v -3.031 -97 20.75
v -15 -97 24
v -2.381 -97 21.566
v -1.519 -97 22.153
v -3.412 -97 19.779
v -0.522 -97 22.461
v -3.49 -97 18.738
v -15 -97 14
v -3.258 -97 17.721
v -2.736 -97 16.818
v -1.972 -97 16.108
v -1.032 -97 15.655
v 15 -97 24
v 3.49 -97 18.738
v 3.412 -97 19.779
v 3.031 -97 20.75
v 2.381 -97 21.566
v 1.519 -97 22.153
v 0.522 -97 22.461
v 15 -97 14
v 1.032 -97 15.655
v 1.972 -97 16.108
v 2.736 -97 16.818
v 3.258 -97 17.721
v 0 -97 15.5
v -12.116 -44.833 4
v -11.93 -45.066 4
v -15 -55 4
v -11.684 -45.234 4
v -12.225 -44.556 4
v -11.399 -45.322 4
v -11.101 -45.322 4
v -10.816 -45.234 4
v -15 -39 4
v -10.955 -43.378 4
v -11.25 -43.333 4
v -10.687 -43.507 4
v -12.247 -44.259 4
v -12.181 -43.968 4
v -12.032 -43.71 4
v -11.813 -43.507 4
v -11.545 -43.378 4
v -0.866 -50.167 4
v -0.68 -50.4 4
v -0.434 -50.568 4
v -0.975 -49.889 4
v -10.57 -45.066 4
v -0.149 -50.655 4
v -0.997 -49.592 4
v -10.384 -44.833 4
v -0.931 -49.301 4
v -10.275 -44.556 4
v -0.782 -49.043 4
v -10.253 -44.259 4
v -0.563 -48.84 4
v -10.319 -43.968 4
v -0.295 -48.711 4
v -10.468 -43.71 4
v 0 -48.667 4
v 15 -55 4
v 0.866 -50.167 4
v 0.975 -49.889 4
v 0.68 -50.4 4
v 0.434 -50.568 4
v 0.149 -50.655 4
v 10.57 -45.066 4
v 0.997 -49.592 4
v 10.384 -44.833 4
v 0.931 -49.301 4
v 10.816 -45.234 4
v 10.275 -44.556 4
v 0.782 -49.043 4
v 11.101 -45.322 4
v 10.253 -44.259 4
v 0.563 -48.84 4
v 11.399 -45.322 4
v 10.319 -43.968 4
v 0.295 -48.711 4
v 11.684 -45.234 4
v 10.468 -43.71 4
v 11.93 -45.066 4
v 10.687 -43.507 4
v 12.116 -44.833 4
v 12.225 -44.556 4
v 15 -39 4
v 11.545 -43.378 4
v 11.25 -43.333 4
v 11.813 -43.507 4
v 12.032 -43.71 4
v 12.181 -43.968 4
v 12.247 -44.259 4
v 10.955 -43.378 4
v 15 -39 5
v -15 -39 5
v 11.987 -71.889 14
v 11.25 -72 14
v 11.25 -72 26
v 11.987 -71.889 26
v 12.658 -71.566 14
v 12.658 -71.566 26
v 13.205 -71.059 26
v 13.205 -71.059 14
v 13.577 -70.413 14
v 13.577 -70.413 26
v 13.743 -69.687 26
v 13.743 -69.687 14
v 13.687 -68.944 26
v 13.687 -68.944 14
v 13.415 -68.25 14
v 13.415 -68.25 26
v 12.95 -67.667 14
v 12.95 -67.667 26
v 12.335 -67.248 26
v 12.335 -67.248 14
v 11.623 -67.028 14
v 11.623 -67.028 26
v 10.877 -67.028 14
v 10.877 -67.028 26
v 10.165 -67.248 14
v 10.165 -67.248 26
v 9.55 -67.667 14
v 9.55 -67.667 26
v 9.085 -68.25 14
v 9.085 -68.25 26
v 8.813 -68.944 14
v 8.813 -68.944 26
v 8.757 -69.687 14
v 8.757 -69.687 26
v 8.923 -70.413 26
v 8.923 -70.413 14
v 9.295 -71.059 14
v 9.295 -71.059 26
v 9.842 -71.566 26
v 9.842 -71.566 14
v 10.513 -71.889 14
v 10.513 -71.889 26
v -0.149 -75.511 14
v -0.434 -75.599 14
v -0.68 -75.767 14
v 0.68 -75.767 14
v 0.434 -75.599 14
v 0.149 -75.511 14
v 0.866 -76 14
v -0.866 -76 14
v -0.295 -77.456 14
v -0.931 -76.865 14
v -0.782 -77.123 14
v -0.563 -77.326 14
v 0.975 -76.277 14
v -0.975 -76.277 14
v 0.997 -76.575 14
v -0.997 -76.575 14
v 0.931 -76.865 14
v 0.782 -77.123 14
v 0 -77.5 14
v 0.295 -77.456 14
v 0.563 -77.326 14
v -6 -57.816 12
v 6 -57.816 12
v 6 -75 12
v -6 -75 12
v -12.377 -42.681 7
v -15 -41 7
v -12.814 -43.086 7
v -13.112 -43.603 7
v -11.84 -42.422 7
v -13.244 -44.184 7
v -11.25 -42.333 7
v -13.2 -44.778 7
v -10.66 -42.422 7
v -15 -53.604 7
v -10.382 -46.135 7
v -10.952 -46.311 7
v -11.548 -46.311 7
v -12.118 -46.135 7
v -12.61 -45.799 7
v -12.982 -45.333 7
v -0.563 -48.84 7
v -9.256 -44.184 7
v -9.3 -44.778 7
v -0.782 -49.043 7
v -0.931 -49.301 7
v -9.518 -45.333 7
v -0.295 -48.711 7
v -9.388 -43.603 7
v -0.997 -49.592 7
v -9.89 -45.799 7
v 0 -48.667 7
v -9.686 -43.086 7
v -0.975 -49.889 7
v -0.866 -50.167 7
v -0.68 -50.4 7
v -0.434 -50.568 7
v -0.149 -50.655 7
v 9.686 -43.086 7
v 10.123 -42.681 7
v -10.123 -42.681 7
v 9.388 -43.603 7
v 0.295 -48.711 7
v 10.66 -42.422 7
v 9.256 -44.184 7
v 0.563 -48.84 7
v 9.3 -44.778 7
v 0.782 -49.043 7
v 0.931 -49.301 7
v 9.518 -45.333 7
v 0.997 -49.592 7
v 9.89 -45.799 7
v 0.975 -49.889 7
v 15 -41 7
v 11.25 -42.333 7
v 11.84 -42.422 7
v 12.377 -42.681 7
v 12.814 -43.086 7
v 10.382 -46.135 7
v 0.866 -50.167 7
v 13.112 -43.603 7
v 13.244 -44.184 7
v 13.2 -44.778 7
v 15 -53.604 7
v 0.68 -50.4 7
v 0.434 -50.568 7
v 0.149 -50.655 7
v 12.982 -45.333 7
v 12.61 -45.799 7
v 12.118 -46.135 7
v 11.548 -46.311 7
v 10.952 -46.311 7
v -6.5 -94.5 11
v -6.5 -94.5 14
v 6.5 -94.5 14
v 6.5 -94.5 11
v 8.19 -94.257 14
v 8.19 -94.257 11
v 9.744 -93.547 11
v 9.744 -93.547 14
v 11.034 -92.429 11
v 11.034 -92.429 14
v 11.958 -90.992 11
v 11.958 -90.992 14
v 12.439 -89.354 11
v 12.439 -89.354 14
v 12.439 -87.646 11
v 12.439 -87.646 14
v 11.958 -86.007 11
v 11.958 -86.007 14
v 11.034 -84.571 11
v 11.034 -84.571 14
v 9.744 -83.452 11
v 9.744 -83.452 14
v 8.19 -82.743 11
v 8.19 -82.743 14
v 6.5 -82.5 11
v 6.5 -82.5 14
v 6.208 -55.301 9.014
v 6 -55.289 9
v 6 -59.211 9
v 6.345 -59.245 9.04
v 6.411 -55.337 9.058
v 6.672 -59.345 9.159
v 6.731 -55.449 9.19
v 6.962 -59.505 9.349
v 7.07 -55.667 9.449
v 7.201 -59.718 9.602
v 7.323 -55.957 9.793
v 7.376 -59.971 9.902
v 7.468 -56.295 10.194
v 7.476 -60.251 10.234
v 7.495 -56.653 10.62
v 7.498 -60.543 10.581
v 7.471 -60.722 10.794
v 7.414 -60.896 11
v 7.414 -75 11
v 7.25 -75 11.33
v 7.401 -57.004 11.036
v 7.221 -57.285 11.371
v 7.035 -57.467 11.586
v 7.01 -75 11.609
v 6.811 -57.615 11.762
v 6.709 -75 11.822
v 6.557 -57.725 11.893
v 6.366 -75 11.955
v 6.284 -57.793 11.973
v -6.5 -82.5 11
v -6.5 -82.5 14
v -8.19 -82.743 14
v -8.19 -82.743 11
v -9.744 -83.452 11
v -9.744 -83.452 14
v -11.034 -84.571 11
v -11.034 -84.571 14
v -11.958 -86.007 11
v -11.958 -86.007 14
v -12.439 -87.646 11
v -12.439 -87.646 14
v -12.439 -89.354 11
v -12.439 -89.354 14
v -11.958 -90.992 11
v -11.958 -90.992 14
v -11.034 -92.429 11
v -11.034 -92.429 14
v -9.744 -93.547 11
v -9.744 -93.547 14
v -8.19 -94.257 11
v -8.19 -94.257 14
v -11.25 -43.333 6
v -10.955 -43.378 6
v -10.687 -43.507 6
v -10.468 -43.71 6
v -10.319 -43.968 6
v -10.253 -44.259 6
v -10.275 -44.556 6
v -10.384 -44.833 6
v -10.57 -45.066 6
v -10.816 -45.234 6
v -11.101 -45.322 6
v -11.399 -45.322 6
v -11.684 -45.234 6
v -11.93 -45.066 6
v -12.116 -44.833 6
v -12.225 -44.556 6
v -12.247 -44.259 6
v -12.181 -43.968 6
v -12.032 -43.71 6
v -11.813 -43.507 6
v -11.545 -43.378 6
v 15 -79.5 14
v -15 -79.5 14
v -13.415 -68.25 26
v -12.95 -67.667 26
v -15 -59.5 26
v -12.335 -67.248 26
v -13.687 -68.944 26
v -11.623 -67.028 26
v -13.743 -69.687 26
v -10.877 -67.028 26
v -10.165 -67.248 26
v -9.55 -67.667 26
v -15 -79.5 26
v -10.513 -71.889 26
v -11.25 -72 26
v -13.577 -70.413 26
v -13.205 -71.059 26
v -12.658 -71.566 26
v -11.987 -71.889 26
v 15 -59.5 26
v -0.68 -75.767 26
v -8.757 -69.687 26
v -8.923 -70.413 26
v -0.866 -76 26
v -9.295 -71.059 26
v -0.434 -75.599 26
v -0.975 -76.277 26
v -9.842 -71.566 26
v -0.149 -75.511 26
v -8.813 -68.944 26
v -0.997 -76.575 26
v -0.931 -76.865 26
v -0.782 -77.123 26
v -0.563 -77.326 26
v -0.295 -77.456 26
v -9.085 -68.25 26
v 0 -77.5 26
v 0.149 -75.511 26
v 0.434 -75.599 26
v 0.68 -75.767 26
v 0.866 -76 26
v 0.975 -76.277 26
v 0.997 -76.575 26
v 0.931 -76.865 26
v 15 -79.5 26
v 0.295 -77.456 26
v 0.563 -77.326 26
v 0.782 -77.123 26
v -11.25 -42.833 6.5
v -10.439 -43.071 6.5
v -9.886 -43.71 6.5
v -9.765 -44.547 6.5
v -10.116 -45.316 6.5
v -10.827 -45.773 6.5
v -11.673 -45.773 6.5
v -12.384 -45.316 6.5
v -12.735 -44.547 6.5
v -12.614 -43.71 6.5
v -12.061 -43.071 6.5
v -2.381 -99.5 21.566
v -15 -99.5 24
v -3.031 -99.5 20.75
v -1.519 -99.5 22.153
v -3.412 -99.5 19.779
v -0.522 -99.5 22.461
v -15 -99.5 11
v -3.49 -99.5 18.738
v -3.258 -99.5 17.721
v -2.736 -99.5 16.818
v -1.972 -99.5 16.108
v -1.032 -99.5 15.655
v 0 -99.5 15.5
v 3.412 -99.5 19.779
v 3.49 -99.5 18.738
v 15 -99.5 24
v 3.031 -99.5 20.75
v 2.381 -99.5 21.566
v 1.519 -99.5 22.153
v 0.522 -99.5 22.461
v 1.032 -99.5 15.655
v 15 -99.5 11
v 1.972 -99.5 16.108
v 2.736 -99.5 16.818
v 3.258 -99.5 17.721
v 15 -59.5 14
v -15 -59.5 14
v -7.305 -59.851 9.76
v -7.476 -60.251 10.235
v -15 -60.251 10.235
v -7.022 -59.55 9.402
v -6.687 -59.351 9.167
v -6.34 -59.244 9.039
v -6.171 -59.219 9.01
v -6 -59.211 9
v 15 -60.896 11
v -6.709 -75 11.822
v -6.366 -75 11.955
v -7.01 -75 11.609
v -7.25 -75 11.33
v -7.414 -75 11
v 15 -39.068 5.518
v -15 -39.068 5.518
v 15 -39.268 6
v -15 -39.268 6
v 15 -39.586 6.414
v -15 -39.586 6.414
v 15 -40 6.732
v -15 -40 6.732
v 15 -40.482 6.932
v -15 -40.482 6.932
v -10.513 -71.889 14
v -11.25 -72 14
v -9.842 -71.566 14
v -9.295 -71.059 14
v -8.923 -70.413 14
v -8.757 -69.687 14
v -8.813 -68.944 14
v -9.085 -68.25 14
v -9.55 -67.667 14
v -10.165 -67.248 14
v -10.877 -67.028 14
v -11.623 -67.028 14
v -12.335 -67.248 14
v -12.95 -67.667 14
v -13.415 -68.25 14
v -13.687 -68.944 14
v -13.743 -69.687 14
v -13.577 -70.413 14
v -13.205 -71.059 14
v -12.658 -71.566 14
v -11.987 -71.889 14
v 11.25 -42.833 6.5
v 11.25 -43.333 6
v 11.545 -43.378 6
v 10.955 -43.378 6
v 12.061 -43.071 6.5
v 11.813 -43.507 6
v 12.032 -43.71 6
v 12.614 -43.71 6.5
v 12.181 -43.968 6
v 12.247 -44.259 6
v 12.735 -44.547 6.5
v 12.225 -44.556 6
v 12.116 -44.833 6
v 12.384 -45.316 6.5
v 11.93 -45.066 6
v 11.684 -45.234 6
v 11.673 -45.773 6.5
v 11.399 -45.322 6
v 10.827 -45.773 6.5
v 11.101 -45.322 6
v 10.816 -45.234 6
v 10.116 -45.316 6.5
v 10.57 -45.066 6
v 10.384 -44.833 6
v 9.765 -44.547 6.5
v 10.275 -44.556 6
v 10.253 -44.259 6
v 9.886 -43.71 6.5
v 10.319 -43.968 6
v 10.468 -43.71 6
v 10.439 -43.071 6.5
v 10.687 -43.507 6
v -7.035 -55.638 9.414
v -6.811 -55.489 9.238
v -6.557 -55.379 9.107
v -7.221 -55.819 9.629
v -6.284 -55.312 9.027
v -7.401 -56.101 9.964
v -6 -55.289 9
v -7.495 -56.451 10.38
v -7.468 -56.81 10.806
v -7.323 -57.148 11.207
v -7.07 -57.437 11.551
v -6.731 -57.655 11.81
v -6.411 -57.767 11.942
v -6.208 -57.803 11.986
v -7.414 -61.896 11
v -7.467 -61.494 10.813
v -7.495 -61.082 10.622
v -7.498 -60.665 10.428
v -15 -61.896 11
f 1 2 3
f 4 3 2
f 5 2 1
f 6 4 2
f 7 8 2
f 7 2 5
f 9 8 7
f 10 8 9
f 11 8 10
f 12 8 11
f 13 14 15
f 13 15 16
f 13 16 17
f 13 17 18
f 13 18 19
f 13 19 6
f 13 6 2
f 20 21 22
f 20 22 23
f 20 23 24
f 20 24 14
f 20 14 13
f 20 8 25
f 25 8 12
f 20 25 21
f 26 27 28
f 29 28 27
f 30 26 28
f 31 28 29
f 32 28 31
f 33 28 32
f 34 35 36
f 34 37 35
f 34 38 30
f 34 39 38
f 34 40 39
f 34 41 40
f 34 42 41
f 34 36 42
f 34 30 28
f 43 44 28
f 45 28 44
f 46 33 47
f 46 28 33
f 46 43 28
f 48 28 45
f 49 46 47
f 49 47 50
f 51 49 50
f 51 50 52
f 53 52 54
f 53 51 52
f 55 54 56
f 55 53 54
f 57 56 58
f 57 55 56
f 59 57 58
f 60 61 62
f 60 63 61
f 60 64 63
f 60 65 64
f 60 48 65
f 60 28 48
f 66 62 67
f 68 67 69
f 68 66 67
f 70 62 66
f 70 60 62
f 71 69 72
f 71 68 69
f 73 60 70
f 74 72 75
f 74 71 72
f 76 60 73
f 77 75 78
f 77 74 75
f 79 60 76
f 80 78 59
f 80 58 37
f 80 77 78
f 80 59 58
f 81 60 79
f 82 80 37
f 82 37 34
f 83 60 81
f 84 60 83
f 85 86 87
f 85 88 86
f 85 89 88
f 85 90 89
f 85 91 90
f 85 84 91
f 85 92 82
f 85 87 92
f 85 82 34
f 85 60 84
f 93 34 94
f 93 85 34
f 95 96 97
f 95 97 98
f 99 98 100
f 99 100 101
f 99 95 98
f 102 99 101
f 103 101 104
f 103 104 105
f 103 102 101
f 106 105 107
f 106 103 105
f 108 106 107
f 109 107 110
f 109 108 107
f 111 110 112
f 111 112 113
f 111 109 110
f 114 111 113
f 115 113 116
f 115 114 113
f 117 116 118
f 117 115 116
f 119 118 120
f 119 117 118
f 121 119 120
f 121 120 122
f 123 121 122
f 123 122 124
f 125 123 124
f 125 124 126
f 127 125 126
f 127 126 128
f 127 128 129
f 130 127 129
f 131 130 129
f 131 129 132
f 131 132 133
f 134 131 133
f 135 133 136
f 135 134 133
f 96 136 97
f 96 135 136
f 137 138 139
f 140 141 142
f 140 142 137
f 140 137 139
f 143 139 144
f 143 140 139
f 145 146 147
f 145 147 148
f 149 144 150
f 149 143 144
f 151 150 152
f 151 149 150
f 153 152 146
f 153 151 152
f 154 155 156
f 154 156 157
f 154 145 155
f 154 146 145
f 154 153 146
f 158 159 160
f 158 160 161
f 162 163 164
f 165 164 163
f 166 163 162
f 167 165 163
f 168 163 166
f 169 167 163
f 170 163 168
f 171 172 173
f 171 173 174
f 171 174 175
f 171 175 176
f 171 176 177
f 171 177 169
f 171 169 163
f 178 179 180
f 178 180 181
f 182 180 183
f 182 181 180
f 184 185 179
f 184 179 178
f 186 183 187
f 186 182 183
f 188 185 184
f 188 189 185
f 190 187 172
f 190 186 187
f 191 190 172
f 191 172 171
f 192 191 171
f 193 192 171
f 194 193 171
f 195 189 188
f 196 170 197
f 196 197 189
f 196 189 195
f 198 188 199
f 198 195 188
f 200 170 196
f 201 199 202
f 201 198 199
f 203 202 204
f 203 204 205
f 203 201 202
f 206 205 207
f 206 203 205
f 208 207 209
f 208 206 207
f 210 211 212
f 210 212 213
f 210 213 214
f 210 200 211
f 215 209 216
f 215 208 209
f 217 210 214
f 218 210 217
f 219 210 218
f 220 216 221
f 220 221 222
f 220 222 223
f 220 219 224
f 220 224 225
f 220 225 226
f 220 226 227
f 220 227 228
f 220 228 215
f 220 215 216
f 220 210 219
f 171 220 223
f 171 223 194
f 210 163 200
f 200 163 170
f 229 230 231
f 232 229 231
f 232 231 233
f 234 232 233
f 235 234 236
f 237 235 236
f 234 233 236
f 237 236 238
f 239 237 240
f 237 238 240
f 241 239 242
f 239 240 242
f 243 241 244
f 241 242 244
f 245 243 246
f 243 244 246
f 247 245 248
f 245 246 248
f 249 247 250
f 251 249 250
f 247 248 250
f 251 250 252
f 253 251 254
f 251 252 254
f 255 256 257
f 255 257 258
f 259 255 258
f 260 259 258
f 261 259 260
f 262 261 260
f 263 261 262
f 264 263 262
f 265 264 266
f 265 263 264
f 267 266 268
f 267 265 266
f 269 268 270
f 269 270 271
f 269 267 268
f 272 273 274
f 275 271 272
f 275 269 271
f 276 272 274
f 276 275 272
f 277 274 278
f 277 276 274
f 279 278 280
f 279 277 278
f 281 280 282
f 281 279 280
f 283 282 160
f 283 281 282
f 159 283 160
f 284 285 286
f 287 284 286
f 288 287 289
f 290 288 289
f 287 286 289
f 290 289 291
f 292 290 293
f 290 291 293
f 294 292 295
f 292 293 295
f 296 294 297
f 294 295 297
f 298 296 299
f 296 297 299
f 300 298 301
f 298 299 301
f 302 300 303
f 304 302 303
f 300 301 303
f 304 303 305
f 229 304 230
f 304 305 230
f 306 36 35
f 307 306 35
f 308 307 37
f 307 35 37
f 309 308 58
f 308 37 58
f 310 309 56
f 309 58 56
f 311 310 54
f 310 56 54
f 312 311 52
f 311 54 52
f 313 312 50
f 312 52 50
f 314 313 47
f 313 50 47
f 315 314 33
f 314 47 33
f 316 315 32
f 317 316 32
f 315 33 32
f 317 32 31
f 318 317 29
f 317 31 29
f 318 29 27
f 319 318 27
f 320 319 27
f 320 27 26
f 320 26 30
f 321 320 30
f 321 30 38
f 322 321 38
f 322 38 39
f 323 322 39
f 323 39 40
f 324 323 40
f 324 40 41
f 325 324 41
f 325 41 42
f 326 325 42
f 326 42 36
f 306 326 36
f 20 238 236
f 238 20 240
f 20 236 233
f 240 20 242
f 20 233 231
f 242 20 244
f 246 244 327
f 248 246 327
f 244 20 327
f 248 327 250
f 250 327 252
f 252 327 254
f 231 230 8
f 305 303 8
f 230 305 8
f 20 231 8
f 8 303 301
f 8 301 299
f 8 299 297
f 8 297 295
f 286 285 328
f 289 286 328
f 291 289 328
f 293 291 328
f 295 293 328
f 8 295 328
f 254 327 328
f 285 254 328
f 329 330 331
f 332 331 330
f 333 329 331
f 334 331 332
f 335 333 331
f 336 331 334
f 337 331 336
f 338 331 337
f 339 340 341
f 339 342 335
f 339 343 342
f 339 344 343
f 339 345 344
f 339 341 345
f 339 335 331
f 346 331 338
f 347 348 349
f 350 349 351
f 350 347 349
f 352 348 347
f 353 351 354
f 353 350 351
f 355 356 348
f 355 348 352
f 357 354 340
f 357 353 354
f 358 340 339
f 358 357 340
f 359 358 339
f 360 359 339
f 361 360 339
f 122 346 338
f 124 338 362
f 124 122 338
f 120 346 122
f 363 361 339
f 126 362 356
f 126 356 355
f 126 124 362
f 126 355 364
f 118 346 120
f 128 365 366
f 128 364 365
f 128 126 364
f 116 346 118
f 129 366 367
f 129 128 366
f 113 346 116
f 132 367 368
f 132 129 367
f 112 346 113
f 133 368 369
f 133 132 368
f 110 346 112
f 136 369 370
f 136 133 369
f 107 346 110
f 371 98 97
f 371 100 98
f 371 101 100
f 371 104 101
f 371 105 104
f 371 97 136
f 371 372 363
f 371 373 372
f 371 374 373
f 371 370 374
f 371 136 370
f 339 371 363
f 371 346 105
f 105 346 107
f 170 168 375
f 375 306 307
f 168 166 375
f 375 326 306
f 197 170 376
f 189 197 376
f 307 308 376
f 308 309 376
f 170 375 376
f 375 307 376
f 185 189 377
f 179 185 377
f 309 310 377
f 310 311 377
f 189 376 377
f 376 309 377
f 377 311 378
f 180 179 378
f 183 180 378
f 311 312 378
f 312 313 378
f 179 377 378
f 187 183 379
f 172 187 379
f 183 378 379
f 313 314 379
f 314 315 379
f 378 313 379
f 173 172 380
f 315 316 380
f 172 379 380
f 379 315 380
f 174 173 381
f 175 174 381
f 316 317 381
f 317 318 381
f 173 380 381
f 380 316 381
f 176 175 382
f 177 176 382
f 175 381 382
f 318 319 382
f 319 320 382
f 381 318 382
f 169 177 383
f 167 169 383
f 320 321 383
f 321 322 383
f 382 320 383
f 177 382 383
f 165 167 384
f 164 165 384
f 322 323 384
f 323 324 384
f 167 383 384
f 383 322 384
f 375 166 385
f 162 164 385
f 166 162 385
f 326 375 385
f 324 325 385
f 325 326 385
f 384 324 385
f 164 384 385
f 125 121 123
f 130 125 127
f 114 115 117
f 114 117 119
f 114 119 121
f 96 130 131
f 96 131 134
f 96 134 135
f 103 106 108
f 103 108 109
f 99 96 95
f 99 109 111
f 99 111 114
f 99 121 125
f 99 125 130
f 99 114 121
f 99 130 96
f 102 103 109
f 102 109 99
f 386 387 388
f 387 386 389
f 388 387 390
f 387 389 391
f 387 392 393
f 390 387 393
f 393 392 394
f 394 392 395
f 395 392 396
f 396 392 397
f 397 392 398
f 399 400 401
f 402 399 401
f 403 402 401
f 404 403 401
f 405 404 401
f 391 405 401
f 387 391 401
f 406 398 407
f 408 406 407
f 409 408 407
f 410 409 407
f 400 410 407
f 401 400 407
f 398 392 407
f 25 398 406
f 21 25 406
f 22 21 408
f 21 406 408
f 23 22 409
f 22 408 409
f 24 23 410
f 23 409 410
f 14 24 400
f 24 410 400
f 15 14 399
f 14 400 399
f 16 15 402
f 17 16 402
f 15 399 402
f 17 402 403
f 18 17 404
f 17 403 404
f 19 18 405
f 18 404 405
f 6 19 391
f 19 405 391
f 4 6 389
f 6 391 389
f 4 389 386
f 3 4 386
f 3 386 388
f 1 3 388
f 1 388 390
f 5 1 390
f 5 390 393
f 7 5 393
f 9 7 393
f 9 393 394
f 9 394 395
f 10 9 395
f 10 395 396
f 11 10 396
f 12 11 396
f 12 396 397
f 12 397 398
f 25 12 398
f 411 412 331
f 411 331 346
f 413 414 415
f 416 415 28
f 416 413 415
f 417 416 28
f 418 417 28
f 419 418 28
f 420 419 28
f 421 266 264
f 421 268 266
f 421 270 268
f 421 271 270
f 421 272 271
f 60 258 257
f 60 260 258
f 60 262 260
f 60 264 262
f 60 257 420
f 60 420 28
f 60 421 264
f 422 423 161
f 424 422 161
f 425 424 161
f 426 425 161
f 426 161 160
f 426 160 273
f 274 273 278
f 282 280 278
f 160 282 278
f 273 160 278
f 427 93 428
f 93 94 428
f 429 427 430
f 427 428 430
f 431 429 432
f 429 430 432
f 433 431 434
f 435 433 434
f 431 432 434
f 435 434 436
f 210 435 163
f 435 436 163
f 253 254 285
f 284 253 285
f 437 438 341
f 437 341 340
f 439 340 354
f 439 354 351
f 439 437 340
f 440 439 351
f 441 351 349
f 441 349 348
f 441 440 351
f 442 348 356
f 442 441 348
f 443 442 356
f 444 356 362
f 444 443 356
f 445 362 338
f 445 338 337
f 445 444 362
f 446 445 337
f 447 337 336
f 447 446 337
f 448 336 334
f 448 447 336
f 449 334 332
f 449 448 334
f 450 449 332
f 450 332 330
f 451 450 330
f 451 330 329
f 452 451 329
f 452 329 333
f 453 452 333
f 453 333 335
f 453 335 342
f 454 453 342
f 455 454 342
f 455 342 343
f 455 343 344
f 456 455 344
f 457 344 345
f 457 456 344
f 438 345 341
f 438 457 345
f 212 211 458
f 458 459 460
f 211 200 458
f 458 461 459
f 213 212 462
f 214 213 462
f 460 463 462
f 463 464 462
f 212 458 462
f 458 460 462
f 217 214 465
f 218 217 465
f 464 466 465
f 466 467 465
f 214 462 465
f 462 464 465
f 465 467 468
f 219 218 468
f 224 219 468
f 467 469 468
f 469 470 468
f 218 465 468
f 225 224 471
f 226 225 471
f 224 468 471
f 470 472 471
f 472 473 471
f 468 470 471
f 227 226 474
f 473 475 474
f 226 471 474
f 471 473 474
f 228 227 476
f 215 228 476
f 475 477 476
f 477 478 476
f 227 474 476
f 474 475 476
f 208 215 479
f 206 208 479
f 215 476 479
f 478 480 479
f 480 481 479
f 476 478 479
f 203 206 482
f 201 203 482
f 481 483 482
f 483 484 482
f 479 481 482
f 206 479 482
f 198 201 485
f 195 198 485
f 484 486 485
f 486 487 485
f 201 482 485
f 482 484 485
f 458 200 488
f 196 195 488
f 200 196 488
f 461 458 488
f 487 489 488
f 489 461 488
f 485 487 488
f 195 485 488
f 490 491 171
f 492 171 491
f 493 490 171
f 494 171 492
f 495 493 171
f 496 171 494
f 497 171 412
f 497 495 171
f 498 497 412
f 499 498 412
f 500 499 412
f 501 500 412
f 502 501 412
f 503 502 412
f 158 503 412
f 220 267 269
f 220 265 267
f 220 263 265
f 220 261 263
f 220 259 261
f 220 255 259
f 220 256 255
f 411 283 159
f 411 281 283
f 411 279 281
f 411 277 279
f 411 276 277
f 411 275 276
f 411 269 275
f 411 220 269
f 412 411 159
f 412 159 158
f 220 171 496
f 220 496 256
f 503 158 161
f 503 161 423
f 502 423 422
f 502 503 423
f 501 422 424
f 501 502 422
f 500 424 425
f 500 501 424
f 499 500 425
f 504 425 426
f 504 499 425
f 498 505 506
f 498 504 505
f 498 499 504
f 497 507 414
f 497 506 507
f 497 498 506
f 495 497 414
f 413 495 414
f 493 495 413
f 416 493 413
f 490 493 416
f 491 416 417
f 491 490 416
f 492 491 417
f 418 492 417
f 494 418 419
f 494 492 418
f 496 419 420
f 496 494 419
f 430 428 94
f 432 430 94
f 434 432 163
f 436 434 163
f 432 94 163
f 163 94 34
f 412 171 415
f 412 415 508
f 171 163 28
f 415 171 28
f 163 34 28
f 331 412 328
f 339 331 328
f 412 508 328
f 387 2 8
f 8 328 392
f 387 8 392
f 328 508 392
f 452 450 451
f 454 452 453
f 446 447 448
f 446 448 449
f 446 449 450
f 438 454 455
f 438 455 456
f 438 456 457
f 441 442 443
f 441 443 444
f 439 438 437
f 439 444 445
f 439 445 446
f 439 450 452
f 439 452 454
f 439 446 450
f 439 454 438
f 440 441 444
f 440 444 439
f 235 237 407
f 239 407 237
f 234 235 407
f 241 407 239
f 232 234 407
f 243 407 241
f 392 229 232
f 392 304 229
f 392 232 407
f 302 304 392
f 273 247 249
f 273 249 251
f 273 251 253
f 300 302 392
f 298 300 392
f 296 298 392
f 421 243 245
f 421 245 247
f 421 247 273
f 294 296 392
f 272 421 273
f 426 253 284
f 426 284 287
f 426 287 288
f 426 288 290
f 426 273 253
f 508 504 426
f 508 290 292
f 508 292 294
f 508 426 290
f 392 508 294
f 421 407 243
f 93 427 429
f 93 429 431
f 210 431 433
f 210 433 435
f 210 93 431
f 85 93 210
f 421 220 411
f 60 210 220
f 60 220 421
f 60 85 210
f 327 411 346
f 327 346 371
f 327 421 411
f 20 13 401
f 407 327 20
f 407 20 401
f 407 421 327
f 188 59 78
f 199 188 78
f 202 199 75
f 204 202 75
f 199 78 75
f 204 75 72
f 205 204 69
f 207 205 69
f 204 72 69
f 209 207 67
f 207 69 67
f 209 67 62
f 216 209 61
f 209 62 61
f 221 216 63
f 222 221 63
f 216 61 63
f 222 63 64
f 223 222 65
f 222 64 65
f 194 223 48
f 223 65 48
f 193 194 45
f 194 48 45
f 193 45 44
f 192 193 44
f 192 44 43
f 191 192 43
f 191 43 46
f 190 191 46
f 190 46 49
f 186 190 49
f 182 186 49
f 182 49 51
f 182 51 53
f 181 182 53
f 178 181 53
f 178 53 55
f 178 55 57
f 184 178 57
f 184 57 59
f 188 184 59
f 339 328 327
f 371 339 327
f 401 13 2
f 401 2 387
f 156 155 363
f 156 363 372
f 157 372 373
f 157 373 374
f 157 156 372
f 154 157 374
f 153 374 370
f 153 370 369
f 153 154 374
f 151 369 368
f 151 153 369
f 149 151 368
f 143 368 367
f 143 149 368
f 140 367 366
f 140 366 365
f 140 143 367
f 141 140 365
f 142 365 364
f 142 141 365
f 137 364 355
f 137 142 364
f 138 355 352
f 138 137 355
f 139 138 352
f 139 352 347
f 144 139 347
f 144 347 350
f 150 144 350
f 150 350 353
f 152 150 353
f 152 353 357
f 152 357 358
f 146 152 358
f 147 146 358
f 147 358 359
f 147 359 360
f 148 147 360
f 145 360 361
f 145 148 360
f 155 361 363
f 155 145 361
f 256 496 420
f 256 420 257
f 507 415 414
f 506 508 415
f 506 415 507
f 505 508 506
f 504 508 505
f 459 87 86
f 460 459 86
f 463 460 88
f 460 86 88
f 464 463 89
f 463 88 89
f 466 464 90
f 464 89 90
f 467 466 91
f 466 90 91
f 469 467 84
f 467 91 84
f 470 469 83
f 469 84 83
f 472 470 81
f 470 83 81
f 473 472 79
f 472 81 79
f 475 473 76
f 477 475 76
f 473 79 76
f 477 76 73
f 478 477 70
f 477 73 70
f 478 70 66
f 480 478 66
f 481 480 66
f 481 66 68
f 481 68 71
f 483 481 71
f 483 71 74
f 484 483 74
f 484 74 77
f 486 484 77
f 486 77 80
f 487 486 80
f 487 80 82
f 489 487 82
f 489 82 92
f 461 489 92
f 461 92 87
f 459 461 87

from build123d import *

# Parameters (mm, degrees)
PAD005_DEPTH        = 15
SKETCH010_W         = 20
SKETCH010_H         = 30
SKETCH010_R         = 2.5
SKETCH010_R_2       = 1
PAD006_DEPTH        = 12
POCKET004_DEPTH     = 20
POCKET004_FACE013_W = 30
POCKET004_FACE013_H = 3
PAD010_DEPTH        = 20
SKETCH012_W         = 2.5
SKETCH012_H         = 30
PAD008_DEPTH        = 10
SKETCH013_R         = 3.5
POCKET005_DEPTH     = 5
POCKET006_DEPTH     = 5
SKETCH015_R         = 1
POCKET007_DEPTH     = 5
FILLET003_R         = 2
CHAMFER001_SIZE     = 1


with BuildPart() as part:
    # Sketch009 → Pad005 (new body, symmetric)
    with BuildSketch(Plane.YZ):
        Polygon((-53.6044145035, 7), (-59.4999553571, 14), (-79.4999553571, 14), (-79.4999553571, 11), (-60.8955408536, 11), (-55, 4), (-39, 4), (-39, 7), align=None)
    extrude(amount=PAD005_DEPTH, both=True)

    # Sketch010 (on Face5 of Pad005) → Pad006 (join)
    with BuildSketch(Plane(origin=(0, 0, 14), x_dir=(0, -1, 0), z_dir=(0, 0, 1))):
        with Locations((69.4999553571, 0)):
            Rectangle(SKETCH010_W, SKETCH010_H)
        with Locations((69.4999553571, 11.25)):
            Circle(SKETCH010_R, mode=Mode.SUBTRACT)
        with Locations((69.4999553571, -11.25)):
            Circle(SKETCH010_R, mode=Mode.SUBTRACT)
        with Locations((76.4999553571, 0)):
            Circle(SKETCH010_R_2, mode=Mode.SUBTRACT)
    extrude(amount=PAD006_DEPTH)

    # Sketch011 → Pocket004 (cut)
    with BuildSketch(Plane.XZ.offset(55)):
        with BuildLine():
            ThreePointArc((-6, 12), (-7.5, 10.5), (-6, 9))
            Line((-6, 9), (6, 9))
            ThreePointArc((6, 9), (7.5, 10.5), (6, 12))
            Line((6, 12), (-6, 12))
        make_face()
    extrude(amount=POCKET004_DEPTH, mode=Mode.SUBTRACT)

    # Pocket004 Face013 → Pad010 (add)
    with BuildSketch(Plane(origin=(0, -79.4999553571, 12.5), x_dir=(-1, 0, 0), z_dir=(0, -1, 0))):
        Rectangle(POCKET004_FACE013_W, POCKET004_FACE013_H)
    extrude(amount=PAD010_DEPTH)

    # Sketch012 (on Face22 of Pad010) → Pad008 (join)
    with BuildSketch(Plane(origin=(0, 0, 14), x_dir=(0, -1, 0), z_dir=(0, 0, 1))):
        with Locations((98.2499553571, 0)):
            Rectangle(SKETCH012_W, SKETCH012_H)
    extrude(amount=PAD008_DEPTH)

    # Sketch013 (on Face30 of Pad008) → Pocket005 (cut)
    with BuildSketch(Plane(origin=(0, -99.4999553571, 0), x_dir=(0, 0, -1), z_dir=(0, -1, 0))):
        with Locations((-19, 0)):
            Circle(SKETCH013_R)
    extrude(amount=-POCKET005_DEPTH, mode=Mode.SUBTRACT)

    # Sketch014 (on Face22 of Pocket005) → Pocket006 (cut)
    with BuildSketch(Plane(origin=(0, 0, 14), x_dir=(0, -1, 0), z_dir=(0, 0, 1))):
        with BuildLine():
            ThreePointArc((94.4999553571, 6.5), (88.4999553571, 12.5), (82.4999553571, 6.5))
            Line((82.4999553571, 6.5), (82.4999553571, -6.5))
            ThreePointArc((82.4999553571, -6.5), (88.4999553571, -12.5), (94.4999553571, -6.5))
            Line((94.4999553571, -6.5), (94.4999553571, 6.5))
        make_face()
    extrude(amount=-POCKET006_DEPTH, mode=Mode.SUBTRACT)

    # Sketch015 (on Face1 of Pocket006) → Pocket007 (cut)
    with BuildSketch(Plane.YX.offset(-4)):
        with Locations((-44.3333333333, 11.25)):
            Circle(SKETCH015_R)
        with Locations((-44.3333333333, -11.25)):
            Circle(SKETCH015_R)
        with Locations((-49.6666666667, 0)):
            Circle(SKETCH015_R)
    extrude(amount=-POCKET007_DEPTH, mode=Mode.SUBTRACT)

    # Fillet003
    fillet003_edges = [part.edges().sort_by_distance(p)[0] for p in [
        (0, -39, 7),
        (6, -66.407758, 12),
    ]]
    fillet(fillet003_edges, radius=FILLET003_R)

    # Chamfer001
    chamfer001_edges = [part.edges().sort_by_distance(p)[0] for p in [
        (-11.207107, -60.895541, 11),
        (-11.25, -45.333333, 7),
        (11.25, -45.333333, 7),
    ]]
    chamfer(chamfer001_edges, length=CHAMFER001_SIZE)


solid = part.part
